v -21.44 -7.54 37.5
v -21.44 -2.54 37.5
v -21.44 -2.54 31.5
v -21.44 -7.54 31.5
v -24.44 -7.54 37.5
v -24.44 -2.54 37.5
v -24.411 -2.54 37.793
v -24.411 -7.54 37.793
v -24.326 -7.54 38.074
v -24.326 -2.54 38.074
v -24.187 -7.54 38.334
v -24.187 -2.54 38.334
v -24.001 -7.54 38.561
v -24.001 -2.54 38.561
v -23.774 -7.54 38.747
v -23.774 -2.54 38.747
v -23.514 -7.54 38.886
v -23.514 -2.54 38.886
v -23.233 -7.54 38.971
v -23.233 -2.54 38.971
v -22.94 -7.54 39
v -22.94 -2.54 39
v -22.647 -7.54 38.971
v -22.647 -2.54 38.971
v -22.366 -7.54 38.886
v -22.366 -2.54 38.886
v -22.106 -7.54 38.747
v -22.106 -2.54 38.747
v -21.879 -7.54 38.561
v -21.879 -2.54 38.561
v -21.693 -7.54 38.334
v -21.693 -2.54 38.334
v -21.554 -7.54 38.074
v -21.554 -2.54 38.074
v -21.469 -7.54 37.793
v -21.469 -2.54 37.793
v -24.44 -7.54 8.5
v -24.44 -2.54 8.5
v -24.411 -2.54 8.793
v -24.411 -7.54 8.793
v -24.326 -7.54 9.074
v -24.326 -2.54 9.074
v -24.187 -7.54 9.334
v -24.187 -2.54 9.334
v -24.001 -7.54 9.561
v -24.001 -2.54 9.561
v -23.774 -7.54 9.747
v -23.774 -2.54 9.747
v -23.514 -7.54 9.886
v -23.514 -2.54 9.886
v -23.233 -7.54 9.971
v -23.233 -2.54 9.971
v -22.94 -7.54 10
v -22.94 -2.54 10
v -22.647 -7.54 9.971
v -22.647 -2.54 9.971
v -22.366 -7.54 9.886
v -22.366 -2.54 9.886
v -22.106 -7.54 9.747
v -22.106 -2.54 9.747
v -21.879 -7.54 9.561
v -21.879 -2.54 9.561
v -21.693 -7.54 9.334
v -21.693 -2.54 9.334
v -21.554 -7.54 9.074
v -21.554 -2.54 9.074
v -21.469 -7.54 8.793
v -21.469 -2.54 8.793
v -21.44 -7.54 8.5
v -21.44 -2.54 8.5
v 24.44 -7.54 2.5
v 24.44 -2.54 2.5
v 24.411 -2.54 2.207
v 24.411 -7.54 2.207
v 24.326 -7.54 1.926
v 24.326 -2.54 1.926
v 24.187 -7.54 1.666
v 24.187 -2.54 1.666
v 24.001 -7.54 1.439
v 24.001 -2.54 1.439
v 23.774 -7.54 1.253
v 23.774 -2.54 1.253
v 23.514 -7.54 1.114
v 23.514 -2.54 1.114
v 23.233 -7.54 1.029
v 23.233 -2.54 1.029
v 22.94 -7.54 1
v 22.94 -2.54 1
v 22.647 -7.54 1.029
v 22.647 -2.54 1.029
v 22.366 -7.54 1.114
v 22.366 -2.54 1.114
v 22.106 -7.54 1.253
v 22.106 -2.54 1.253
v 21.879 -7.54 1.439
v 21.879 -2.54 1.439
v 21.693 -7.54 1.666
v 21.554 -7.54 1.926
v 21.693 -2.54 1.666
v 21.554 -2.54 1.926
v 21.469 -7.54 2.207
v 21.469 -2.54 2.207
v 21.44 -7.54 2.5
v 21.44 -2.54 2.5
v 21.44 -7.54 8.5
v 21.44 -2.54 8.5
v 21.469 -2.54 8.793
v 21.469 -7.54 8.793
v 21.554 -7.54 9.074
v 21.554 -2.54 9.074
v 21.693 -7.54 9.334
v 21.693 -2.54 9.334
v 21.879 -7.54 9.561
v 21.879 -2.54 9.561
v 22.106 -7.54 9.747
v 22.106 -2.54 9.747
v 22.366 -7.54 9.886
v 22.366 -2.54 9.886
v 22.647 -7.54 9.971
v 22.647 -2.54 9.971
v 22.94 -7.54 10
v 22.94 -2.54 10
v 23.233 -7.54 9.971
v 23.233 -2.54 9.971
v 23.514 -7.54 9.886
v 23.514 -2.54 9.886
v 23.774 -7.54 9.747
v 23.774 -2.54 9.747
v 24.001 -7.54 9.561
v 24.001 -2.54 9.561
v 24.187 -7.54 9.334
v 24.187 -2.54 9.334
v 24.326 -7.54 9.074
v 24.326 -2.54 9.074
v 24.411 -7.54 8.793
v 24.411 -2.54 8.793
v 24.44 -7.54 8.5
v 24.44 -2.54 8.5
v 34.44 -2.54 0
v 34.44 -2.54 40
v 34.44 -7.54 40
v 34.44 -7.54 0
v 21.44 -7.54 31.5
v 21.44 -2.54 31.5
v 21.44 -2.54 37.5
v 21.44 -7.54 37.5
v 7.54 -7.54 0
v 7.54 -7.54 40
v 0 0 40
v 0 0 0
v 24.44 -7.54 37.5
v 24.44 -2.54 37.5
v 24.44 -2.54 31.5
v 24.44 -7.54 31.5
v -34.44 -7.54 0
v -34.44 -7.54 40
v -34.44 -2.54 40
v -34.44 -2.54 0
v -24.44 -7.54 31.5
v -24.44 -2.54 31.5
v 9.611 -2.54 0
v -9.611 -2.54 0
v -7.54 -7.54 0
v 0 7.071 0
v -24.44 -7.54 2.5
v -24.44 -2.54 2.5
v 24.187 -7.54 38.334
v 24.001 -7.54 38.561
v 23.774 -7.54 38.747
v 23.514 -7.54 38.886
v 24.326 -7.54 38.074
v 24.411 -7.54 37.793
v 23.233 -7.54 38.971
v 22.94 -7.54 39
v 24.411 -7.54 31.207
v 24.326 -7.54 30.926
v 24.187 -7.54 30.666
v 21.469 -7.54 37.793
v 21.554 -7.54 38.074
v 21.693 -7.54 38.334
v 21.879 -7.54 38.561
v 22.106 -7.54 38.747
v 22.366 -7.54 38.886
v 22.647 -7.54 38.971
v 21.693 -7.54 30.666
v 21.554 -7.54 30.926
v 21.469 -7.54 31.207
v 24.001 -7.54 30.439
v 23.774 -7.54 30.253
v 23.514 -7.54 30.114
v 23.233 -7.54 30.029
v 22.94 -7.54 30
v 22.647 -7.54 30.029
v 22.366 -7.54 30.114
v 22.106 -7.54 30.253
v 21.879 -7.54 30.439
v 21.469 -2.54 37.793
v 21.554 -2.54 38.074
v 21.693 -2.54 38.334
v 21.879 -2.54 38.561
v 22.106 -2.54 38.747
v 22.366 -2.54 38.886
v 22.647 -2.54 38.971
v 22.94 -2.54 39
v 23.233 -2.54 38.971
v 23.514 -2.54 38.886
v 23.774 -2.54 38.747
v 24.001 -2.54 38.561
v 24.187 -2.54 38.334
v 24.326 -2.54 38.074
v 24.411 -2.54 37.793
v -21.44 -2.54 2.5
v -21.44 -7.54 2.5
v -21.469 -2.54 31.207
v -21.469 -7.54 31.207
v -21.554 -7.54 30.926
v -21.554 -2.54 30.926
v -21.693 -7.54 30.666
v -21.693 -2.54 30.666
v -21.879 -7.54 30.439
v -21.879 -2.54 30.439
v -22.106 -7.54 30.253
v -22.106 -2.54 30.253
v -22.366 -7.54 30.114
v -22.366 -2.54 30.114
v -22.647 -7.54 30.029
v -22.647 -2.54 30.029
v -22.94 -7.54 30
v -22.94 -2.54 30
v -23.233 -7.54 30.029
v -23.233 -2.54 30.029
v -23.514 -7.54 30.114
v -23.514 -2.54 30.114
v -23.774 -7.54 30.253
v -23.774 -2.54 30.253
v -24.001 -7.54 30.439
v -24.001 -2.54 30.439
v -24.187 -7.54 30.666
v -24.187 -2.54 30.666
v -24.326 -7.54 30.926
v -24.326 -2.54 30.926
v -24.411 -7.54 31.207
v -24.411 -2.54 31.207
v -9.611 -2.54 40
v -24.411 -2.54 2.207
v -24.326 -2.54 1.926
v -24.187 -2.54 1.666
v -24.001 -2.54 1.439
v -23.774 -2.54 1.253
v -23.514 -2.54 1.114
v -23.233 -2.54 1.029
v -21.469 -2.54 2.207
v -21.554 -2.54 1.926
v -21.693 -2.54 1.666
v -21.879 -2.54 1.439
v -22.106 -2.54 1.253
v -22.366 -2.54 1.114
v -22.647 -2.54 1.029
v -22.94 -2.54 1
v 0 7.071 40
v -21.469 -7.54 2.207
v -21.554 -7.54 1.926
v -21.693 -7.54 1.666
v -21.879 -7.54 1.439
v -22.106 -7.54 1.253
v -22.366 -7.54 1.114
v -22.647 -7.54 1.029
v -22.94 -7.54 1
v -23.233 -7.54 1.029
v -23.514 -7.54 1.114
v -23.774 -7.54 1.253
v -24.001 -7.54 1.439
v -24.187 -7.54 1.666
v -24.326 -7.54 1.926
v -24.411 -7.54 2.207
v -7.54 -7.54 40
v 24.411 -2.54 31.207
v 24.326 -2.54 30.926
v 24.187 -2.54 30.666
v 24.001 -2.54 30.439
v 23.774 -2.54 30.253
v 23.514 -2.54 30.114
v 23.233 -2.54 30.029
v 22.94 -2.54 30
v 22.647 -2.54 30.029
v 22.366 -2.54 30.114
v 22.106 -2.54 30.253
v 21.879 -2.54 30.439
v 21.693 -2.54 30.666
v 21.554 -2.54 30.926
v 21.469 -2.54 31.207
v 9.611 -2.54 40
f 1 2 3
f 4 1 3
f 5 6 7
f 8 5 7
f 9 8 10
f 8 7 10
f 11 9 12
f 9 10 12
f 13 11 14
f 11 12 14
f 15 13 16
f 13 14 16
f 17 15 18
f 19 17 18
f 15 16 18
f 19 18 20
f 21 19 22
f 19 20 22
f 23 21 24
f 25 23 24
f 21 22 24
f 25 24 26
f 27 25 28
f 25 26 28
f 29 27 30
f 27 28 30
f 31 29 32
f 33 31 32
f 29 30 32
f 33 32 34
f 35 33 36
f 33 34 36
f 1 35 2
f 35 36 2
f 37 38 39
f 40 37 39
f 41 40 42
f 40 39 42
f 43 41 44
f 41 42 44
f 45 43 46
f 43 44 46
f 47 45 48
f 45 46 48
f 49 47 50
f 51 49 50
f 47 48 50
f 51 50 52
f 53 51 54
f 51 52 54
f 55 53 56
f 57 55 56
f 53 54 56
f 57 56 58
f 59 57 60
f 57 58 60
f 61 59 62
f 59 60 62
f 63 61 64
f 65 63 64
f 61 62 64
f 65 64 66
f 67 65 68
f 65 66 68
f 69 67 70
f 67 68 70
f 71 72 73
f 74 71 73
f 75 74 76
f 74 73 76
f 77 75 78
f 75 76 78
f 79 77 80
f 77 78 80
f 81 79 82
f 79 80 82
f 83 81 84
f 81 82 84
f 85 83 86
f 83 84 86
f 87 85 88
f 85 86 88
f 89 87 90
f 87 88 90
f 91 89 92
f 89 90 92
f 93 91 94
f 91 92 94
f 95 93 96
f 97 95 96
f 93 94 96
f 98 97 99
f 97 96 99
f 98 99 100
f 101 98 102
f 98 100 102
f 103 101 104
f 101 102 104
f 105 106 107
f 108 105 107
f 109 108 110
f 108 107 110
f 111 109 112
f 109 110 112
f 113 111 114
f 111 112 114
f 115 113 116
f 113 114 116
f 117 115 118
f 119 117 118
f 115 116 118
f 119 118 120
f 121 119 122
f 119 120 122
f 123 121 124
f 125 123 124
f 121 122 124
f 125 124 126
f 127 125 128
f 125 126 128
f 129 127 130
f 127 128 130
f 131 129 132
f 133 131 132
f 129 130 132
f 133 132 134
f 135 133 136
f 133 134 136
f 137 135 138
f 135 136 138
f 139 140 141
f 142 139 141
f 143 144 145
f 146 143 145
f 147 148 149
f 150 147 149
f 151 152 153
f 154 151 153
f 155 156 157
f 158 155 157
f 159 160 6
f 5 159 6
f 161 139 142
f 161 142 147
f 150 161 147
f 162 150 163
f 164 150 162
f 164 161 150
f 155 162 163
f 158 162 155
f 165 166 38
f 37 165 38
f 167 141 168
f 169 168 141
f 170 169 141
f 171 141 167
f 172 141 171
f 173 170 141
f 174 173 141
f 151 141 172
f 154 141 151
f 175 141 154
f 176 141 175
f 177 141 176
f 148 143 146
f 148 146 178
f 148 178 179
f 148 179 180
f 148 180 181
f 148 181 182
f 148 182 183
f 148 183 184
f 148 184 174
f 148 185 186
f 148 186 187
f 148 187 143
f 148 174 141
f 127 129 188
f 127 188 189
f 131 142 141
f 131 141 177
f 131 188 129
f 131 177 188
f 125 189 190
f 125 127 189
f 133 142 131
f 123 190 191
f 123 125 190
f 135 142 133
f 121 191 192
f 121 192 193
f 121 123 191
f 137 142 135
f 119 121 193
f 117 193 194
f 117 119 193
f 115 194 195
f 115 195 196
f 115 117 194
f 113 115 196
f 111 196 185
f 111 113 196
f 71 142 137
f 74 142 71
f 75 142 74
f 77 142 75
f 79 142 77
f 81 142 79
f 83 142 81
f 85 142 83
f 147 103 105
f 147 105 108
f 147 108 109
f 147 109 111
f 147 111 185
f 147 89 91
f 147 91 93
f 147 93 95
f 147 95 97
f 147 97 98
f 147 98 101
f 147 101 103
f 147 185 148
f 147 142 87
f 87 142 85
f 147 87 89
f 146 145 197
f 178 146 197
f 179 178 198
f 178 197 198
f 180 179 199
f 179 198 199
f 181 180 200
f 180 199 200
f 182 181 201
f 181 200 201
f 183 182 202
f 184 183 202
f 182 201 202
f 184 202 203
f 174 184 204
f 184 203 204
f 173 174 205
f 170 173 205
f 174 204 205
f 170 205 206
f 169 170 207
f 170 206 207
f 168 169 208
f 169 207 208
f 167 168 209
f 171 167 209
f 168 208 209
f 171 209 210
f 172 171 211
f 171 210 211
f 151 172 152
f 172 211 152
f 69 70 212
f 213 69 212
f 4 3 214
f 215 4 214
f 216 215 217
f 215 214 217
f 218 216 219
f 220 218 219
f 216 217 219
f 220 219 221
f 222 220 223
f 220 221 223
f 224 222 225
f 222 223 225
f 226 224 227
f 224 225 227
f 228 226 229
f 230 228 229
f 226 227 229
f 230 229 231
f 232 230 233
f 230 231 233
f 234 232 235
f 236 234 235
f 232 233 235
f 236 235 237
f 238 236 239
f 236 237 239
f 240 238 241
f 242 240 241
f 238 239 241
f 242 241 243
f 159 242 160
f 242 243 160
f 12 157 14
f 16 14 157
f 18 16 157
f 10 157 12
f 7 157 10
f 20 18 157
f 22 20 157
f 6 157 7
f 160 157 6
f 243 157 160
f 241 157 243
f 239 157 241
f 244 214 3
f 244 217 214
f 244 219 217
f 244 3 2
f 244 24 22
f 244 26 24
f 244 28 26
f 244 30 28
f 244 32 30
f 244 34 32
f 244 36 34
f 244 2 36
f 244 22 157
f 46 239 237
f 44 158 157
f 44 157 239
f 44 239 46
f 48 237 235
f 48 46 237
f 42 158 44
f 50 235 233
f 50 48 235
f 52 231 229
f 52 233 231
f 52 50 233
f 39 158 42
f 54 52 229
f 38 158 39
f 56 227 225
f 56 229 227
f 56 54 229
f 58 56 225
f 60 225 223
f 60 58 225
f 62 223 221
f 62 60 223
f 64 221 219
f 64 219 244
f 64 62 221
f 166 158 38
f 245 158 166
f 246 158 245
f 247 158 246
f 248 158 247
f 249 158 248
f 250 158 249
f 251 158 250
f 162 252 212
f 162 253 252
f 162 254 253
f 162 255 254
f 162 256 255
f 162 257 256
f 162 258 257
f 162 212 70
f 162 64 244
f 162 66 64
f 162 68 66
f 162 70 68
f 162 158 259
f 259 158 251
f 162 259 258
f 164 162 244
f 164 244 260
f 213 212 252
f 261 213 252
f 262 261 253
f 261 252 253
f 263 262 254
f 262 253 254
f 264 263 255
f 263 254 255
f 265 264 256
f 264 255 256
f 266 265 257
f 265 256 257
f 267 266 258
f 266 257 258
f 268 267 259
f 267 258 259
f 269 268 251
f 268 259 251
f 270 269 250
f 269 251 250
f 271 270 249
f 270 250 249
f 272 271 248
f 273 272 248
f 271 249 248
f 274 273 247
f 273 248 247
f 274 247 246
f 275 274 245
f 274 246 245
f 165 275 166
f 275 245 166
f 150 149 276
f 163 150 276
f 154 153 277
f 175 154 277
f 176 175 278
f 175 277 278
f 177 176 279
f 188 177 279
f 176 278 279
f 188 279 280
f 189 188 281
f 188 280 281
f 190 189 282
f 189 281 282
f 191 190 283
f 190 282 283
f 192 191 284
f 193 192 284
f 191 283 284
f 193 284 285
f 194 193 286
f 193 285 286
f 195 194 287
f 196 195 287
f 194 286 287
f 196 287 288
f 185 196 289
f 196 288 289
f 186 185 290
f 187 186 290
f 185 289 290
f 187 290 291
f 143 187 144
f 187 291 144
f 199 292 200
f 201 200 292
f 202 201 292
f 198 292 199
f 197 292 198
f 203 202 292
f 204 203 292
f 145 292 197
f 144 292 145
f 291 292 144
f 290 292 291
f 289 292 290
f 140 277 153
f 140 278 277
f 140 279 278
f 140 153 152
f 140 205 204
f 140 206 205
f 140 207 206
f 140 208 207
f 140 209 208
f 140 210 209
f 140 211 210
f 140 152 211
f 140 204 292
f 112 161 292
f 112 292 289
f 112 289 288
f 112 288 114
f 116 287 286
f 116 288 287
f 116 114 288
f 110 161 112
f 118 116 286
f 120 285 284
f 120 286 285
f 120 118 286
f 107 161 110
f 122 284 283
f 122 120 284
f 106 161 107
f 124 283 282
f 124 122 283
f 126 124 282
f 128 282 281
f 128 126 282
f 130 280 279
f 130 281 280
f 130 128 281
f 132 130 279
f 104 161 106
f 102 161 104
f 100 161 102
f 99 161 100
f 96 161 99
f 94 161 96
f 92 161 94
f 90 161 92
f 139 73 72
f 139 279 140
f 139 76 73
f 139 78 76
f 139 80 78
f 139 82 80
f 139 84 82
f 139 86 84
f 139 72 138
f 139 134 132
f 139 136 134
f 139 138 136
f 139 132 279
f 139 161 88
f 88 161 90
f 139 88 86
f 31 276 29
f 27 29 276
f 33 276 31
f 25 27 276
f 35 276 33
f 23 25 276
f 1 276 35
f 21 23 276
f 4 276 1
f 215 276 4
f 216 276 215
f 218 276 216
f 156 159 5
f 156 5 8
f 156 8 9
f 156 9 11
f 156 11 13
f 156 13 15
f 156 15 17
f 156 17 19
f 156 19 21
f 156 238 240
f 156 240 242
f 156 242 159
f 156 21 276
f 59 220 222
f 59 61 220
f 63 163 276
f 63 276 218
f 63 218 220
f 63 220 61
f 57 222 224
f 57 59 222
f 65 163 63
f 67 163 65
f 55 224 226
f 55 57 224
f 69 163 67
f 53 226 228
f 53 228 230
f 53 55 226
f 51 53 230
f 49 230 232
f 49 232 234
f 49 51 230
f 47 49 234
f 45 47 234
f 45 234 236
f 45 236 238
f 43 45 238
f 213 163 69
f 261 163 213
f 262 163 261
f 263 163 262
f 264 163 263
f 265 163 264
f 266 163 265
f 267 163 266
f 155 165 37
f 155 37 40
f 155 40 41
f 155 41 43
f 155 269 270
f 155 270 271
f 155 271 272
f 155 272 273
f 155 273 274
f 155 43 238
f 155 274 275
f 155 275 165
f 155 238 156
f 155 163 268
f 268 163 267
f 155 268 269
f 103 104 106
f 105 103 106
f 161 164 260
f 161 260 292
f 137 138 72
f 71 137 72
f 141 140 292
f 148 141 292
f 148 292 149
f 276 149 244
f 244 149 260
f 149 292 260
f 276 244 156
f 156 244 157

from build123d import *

# Parameters (mm, degrees)
BOSS_EXTRUDE1_DEPTH = 40
CUT_EXTRUDE1_DEPTH  = 10


with BuildPart() as part:
    # Sketch1 → Boss-Extrude1 (new body)
    with BuildSketch(Plane.XY):
        Polygon((0, 0), (-7.54, -7.54), (-34.44, -7.54), (-34.44, -2.54), (-9.611067812, -2.54), (0, 7.071067812), (9.611067812, -2.54), (34.44, -2.54), (34.44, -7.54), (7.54, -7.54), align=None)
    extrude(amount=BOSS_EXTRUDE1_DEPTH)

    # Sketch3 → Cut-Extrude1 (cut)
    with BuildSketch(Plane(origin=(0, -2.54, 0), x_dir=(1, 0, 0), z_dir=(0, 1, 0))):
        with BuildLine():
            Line((-24.440315349, -31.5), (-24.440315349, -37.5))
            ThreePointArc((-24.440315349, -37.5), (-22.94, -39.000315349), (-21.439684651, -37.5))
            Line((-21.439684651, -37.5), (-21.439684651, -31.5))
            ThreePointArc((-21.439684651, -31.5), (-22.94, -29.999684651), (-24.440315349, -31.5))
        make_face()
        with BuildLine():
            Line((21.439684651, -2.5), (21.439684651, -8.5))
            ThreePointArc((21.439684651, -8.5), (22.94, -10.000315349), (24.440315349, -8.5))
            Line((24.440315349, -8.5), (24.440315349, -2.5))
            ThreePointArc((24.440315349, -2.5), (22.94, -0.999684651), (21.439684651, -2.5))
        make_face()
        with BuildLine():
            Line((-24.440315349, -2.5), (-24.440315349, -8.5))
            ThreePointArc((-24.440315349, -8.5), (-22.94, -10.000315349), (-21.439684651, -8.5))
            Line((-21.439684651, -8.5), (-21.439684651, -2.5))
            ThreePointArc((-21.439684651, -2.5), (-22.94, -0.999684651), (-24.440315349, -2.5))
        make_face()
        with BuildLine():
            Line((21.439684651, -31.5), (21.439684651, -37.5))
            ThreePointArc((21.439684651, -37.5), (22.94, -39.000315349), (24.440315349, -37.5))
            Line((24.440315349, -37.5), (24.440315349, -31.5))
            ThreePointArc((24.440315349, -31.5), (22.94, -29.999684651), (21.439684651, -31.5))
        make_face()
    extrude(amount=-CUT_EXTRUDE1_DEPTH, mode=Mode.SUBTRACT)


solid = part.part
